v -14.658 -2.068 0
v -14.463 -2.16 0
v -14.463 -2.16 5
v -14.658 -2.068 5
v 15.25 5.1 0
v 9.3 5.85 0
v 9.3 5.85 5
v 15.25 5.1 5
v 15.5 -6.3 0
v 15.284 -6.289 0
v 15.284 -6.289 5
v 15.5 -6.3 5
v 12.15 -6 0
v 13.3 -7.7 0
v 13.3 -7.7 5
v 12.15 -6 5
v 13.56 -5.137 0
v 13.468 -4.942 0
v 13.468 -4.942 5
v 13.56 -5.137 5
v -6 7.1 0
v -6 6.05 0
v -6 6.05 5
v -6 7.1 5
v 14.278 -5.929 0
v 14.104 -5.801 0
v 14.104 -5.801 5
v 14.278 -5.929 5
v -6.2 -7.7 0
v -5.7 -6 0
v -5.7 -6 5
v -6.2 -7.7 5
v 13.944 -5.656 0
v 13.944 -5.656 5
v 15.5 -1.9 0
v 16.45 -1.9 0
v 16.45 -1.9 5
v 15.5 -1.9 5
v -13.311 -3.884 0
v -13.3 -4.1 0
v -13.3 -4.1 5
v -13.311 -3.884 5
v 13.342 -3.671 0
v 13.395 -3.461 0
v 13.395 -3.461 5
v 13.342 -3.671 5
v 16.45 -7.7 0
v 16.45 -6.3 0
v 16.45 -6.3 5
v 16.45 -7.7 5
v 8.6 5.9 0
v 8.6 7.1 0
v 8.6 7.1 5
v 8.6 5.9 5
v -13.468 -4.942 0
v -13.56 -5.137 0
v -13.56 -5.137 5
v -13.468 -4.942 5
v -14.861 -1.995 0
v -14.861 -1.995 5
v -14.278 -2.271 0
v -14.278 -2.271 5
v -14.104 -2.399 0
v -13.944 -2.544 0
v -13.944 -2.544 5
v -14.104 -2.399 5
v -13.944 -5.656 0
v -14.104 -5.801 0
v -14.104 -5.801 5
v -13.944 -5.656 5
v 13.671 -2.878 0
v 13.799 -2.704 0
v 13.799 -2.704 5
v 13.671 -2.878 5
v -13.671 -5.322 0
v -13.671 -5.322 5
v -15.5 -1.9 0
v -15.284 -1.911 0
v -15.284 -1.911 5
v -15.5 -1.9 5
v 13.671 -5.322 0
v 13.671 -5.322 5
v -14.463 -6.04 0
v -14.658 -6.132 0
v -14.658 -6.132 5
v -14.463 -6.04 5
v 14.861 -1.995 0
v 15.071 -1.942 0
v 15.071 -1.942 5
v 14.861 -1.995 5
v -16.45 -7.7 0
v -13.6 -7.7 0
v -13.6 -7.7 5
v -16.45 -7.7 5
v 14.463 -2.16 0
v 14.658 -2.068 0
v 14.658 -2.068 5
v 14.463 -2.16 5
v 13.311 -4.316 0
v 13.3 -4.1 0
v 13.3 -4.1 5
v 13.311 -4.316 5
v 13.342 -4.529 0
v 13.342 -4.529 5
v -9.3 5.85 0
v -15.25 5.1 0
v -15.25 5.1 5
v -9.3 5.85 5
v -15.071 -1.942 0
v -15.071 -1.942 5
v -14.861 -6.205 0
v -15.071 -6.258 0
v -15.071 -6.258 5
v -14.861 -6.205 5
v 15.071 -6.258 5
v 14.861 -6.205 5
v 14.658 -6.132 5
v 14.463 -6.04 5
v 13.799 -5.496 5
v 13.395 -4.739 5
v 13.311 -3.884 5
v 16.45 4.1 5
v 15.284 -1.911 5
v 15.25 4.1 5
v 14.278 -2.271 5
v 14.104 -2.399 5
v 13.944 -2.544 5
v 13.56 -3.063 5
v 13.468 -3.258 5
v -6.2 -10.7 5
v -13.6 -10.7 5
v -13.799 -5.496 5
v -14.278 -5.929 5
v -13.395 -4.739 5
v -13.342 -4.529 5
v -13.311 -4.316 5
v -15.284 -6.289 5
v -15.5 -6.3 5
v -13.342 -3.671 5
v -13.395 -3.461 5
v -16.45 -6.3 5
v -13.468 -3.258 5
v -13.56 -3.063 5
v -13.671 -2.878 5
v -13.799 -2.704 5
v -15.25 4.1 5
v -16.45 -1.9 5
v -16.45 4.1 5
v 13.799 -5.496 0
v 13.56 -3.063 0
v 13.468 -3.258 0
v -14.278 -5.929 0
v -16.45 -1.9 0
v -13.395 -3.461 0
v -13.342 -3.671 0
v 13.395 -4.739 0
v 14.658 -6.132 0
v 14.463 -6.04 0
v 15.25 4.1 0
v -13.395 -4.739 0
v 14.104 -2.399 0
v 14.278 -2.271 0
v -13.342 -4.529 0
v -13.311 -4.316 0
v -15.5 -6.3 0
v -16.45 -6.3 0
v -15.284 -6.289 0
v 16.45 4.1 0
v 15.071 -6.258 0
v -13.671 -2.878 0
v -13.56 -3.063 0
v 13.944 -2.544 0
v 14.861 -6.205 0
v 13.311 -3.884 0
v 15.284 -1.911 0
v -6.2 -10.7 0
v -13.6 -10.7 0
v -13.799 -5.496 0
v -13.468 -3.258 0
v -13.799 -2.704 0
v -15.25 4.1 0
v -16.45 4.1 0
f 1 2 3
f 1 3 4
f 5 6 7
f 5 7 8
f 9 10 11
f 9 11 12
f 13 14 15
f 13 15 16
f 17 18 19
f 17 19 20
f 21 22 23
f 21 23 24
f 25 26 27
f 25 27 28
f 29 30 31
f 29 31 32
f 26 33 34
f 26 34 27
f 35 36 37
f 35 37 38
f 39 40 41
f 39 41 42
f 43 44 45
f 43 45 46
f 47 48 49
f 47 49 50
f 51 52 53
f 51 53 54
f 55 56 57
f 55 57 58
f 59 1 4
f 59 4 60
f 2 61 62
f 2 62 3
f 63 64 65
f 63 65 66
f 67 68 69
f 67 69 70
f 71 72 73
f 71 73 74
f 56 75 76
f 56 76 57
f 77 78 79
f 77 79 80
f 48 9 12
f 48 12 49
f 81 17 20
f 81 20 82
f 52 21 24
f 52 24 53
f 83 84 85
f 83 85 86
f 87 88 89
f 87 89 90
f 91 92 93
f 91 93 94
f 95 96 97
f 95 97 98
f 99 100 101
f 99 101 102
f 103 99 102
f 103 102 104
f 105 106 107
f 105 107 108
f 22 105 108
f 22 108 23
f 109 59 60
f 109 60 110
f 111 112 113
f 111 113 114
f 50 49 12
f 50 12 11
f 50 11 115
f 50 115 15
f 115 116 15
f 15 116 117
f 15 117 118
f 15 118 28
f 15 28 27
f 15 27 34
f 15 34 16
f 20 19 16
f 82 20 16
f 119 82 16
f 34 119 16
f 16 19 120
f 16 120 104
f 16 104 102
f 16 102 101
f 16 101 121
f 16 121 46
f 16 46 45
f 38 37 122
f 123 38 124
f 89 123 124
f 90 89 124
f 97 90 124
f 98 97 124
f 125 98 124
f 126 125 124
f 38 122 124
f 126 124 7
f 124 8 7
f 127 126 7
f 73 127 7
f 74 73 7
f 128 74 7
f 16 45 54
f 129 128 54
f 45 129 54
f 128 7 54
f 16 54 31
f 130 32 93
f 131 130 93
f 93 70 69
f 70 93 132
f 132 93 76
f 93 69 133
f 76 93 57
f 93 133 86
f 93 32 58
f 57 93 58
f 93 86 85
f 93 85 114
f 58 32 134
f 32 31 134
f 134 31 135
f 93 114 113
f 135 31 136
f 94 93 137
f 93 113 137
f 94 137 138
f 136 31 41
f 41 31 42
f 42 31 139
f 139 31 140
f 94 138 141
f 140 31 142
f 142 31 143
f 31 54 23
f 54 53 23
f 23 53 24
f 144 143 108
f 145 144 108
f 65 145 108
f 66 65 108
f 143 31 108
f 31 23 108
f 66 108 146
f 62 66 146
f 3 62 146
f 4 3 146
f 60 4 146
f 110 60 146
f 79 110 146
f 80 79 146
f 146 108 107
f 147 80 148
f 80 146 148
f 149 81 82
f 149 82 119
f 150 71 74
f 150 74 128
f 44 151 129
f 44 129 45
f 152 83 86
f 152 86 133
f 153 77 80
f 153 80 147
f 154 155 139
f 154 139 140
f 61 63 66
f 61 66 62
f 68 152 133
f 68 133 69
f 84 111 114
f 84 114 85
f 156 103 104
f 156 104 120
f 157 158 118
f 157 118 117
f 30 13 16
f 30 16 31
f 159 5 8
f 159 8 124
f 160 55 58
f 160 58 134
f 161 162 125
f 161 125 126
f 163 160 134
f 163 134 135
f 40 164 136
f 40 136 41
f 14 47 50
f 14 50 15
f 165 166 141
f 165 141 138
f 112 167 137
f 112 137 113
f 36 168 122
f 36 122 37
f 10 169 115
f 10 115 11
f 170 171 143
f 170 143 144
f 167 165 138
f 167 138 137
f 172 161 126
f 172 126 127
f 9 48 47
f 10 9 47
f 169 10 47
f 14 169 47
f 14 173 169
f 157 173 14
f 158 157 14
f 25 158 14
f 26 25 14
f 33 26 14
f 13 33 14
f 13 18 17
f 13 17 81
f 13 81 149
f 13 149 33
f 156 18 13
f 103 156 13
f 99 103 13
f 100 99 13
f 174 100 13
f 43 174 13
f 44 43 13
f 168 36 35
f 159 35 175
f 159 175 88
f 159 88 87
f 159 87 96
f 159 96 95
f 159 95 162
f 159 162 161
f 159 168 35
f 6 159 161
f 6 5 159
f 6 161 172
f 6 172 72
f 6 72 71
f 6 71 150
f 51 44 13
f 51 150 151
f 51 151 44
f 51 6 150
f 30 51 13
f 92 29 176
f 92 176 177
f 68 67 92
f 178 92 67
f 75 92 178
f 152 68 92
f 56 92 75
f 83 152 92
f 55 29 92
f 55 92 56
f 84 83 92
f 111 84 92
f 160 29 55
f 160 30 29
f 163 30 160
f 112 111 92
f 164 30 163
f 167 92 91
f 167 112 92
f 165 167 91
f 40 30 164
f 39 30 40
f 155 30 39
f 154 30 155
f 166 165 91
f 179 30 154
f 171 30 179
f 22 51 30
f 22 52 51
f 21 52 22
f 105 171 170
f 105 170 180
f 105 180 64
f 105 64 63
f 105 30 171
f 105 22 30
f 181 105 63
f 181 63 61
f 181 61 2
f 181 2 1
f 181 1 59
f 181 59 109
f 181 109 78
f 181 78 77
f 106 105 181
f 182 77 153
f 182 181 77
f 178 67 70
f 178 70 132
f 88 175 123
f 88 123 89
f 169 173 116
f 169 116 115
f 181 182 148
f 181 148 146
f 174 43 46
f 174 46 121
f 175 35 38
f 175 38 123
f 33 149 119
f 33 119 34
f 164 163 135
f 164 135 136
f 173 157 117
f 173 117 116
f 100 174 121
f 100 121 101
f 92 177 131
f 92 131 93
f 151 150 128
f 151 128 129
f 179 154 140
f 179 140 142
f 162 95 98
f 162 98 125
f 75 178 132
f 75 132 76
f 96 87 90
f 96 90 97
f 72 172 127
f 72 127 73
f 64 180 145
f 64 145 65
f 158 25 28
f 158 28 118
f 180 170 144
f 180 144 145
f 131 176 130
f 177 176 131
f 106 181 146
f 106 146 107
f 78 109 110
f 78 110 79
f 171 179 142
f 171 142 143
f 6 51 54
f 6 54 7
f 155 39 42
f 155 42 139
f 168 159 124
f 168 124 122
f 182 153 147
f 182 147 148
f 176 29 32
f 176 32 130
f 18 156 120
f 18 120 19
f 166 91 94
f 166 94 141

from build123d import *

# Parameters (mm, degrees)
COMPONENT_OUTLINE_DEPTH = 5


with BuildPart() as part:
    # 草图1 → Component_Outline (new body)
    with BuildSketch(Plane.XY):
        Polygon((-13.6, -10.7), (-13.6, -7.7), (-16.45, -7.7), (-16.45, -6.3), (-15.5, -6.3), (-15.2844, -6.2894), (-15.0708, -6.2577), (-14.8614, -6.2053), (-14.6581, -6.1325), (-14.4629, -6.0402), (-14.2778, -5.9292), (-14.1043, -5.8006), (-13.9444, -5.6556), (-13.7994, -5.4957), (-13.6708, -5.3223), (-13.5598, -5.1371), (-13.4675, -4.9419), (-13.3947, -4.7386), (-13.3423, -4.5292), (-13.3106, -4.3157), (-13.3, -4.1), (-13.3106, -3.8844), (-13.3423, -3.6708), (-13.3947, -3.4614), (-13.4675, -3.2581), (-13.5598, -3.0629), (-13.6708, -2.8777), (-13.7994, -2.7043), (-13.9444, -2.5444), (-14.1043, -2.3994), (-14.2778, -2.2708), (-14.4629, -2.1598), (-14.6581, -2.0675), (-14.8614, -1.9947), (-15.0708, -1.9423), (-15.2844, -1.9106), (-15.5, -1.9), (-16.45, -1.9), (-16.45, 4.1), (-15.25, 4.1), (-15.25, 5.1), (-9.3, 5.85), (-6, 6.05), (-6, 7.1), (8.6, 7.1), (8.6, 5.9), (9.3, 5.85), (15.25, 5.1), (15.25, 4.1), (16.45, 4.1), (16.45, -1.9), (15.5, -1.9), (15.2844, -1.9106), (15.0708, -1.9423), (14.8614, -1.9947), (14.6581, -2.0675), (14.4629, -2.1598), (14.2778, -2.2708), (14.1043, -2.3994), (13.9444, -2.5444), (13.7994, -2.7043), (13.6708, -2.8777), (13.5598, -3.0629), (13.4675, -3.2581), (13.3947, -3.4614), (13.3423, -3.6708), (13.3106, -3.8844), (13.3, -4.1), (13.3106, -4.3157), (13.3423, -4.5292), (13.3947, -4.7386), (13.4675, -4.9419), (13.5598, -5.1371), (13.6708, -5.3223), (13.7994, -5.4957), (13.9444, -5.6556), (14.1043, -5.8006), (14.2778, -5.9292), (14.4629, -6.0402), (14.6581, -6.1325), (14.8614, -6.2053), (15.0708, -6.2577), (15.2844, -6.2894), (15.5, -6.3), (16.45, -6.3), (16.45, -7.7), (13.3, -7.7), (12.15, -6), (-5.7, -6), (-6.2, -7.7), (-6.2, -10.7), align=None)
    extrude(amount=COMPONENT_OUTLINE_DEPTH)


solid = part.part
